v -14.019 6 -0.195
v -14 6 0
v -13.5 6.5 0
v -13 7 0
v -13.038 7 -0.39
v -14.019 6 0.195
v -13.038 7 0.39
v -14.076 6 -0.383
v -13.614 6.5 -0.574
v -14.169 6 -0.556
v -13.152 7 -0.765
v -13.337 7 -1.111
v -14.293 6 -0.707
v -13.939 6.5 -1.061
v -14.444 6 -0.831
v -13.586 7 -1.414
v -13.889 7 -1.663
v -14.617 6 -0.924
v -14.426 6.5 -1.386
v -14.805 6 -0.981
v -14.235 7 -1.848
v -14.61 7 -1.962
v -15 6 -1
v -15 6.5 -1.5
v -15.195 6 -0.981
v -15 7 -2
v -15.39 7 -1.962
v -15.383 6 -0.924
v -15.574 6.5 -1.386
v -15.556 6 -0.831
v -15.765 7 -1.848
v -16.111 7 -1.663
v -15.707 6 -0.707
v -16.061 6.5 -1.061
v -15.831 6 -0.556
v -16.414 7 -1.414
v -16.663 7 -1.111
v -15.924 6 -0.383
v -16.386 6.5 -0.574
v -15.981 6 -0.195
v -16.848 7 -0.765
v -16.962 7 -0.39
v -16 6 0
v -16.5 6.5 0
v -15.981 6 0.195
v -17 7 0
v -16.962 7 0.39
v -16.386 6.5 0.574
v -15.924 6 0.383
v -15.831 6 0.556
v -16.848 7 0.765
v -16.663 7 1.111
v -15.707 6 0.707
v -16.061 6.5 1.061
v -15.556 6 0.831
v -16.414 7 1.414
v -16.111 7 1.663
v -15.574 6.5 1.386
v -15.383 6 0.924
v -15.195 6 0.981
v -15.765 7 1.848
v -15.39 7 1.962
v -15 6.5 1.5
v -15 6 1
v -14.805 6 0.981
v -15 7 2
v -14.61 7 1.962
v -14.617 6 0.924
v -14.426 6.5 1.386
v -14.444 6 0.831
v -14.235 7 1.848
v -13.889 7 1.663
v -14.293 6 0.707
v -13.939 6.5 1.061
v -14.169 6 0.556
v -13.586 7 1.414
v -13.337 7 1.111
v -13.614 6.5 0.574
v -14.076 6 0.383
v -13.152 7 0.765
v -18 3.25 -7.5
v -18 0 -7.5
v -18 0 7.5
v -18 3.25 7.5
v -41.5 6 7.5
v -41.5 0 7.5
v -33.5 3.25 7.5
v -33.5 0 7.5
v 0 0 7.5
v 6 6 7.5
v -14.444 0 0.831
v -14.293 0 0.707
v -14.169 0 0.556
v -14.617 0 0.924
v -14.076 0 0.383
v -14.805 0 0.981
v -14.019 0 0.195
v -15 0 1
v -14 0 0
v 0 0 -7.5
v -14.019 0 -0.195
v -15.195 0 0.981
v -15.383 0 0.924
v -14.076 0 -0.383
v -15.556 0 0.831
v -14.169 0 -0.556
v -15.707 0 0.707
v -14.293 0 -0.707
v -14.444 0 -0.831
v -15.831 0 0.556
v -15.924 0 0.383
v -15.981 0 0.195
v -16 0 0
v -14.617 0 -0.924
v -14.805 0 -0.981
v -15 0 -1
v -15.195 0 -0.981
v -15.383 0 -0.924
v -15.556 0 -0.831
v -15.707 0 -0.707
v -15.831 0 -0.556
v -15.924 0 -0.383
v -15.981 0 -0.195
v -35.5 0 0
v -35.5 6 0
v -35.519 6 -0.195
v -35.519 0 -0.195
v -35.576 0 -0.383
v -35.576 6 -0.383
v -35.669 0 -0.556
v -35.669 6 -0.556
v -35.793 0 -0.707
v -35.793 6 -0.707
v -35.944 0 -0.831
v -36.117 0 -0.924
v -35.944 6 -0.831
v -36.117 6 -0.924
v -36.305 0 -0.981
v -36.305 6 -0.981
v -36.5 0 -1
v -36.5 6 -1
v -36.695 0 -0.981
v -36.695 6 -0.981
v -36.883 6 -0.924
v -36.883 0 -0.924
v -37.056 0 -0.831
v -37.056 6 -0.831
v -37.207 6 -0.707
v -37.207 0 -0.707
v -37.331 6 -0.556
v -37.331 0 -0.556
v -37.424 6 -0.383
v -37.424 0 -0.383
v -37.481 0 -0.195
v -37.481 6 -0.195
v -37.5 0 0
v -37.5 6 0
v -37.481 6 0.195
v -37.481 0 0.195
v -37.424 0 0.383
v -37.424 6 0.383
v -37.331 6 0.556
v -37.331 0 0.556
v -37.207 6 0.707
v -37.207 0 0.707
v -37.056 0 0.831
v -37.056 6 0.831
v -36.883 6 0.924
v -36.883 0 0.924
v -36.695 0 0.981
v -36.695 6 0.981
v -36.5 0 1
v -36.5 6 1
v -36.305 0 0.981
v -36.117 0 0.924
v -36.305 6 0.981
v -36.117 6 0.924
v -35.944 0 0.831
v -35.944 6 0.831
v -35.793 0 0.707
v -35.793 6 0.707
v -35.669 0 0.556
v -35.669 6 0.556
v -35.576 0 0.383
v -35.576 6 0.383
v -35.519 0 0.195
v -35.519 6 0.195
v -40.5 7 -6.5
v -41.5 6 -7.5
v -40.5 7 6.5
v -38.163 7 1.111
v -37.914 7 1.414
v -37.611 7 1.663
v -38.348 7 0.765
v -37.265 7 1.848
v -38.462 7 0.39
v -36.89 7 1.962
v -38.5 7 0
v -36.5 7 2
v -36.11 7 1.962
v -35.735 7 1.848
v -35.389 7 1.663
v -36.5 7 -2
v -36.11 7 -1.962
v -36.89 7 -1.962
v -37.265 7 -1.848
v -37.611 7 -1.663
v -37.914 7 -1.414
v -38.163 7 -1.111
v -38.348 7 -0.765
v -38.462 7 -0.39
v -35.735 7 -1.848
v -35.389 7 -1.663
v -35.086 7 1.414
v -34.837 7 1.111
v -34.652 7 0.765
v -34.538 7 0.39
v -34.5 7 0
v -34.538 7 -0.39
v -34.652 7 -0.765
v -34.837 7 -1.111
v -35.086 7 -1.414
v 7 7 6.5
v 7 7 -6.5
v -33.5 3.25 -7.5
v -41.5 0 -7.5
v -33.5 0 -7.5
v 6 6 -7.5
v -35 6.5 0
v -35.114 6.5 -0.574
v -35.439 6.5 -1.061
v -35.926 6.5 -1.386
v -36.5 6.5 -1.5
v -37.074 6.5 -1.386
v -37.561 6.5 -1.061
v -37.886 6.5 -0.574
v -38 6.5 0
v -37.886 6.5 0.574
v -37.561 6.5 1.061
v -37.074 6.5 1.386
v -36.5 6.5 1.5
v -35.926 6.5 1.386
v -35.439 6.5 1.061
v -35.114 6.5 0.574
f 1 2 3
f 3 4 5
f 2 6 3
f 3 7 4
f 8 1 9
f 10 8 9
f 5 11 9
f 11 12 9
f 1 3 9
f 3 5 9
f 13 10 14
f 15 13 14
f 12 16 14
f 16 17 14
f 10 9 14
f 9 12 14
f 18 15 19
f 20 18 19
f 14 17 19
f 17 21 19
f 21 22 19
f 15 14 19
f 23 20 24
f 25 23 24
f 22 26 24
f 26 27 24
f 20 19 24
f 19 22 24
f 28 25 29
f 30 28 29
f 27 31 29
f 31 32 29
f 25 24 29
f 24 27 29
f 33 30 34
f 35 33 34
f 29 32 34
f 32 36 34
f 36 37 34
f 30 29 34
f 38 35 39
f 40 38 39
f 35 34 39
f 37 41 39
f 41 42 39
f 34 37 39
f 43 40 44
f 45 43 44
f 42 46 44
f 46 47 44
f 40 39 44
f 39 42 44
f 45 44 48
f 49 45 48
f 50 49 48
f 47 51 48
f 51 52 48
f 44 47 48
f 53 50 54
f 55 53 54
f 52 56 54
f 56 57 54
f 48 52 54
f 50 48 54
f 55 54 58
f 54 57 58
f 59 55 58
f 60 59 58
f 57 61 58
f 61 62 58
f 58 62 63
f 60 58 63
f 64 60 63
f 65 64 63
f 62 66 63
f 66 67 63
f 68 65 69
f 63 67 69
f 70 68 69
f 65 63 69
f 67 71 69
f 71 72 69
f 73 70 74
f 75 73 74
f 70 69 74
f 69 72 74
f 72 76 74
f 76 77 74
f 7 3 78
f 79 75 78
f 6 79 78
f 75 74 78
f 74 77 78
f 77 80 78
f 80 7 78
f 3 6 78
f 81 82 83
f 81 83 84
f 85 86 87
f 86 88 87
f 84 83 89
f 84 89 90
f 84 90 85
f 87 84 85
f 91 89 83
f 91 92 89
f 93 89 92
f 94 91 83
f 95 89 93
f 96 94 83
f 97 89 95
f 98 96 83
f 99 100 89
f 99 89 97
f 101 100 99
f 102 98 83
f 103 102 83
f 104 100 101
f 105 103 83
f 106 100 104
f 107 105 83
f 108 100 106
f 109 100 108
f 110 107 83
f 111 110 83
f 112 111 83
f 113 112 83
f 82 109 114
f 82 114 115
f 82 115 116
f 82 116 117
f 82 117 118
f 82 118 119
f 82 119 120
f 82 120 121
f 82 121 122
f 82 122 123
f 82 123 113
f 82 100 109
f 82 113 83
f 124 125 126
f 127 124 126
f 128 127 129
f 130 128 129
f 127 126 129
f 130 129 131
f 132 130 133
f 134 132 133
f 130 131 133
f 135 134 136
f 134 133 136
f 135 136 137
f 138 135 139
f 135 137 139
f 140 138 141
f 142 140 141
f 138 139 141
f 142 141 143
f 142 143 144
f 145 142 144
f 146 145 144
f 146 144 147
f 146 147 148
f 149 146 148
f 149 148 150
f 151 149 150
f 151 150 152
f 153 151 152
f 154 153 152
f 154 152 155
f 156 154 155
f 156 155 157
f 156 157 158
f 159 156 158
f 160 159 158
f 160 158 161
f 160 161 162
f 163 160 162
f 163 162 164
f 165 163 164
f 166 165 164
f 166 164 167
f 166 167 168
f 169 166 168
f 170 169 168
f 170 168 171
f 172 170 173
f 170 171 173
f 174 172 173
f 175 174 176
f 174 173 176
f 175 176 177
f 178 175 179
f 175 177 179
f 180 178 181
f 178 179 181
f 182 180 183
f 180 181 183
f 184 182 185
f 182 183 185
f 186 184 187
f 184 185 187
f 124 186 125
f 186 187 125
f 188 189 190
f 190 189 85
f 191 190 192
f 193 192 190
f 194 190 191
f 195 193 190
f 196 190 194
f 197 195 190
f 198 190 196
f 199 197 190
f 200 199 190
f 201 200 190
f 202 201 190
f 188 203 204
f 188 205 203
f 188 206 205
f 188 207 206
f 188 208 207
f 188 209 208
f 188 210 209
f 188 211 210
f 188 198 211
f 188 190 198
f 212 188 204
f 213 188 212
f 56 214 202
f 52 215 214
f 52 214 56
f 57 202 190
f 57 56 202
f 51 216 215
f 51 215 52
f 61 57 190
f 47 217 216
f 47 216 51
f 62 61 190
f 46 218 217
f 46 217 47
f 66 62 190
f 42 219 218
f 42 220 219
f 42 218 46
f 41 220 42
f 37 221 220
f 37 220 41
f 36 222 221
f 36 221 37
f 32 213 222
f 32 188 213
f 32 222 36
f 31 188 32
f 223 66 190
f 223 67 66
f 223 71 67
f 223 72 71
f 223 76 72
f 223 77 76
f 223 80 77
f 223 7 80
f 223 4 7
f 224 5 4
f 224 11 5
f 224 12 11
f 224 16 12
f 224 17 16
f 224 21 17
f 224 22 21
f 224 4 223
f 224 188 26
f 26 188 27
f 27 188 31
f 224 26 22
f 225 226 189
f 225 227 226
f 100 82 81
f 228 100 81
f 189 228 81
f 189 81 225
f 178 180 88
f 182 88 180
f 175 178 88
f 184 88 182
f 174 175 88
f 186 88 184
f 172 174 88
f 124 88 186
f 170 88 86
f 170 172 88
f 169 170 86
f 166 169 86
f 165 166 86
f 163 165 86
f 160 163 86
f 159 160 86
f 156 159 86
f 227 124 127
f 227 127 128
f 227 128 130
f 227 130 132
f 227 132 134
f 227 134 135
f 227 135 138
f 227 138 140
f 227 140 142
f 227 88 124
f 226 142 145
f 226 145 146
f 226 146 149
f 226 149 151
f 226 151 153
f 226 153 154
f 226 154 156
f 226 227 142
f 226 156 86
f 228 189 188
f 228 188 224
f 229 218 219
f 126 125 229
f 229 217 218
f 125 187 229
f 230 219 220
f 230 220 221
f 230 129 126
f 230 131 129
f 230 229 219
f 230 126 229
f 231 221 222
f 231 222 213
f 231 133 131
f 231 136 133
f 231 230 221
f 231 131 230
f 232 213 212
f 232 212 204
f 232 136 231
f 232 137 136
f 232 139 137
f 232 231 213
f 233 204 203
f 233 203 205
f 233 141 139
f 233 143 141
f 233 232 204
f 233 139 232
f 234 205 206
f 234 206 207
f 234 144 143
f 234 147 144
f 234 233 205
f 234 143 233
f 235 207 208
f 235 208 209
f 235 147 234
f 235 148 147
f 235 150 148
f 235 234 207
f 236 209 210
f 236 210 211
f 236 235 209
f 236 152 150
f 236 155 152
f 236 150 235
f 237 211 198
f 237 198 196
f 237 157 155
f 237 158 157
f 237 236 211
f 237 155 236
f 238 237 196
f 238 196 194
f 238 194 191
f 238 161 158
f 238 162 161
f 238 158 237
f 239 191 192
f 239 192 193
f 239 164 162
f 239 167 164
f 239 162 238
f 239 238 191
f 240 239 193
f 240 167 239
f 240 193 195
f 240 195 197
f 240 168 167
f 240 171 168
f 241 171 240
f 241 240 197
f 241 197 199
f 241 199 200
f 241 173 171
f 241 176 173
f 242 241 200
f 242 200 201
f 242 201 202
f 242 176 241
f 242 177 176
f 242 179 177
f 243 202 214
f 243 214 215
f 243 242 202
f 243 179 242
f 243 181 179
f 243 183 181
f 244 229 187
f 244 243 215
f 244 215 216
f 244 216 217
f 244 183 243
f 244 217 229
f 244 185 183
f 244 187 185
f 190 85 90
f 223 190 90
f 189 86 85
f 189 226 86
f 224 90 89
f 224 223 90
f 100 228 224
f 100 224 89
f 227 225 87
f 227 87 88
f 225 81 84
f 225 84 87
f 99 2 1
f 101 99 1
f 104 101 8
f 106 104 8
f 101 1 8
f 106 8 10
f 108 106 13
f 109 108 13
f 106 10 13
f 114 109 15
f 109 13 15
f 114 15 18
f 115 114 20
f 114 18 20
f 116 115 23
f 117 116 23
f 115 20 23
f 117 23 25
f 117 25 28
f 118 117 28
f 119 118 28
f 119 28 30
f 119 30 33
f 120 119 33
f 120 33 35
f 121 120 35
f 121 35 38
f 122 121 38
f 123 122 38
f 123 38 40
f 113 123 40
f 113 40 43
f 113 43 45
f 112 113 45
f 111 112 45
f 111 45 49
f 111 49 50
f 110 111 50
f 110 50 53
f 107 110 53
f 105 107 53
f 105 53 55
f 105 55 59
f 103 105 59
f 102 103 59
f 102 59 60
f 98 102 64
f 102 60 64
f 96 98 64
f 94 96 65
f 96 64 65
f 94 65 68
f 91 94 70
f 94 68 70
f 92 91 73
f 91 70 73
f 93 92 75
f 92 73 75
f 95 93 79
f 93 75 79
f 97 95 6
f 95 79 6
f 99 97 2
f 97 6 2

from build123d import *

# Parameters (mm, degrees)
PAD004_DEPTH            = 7.5
SKETCH007_R             = 1
POCKET002_DEPTH         = 7.001
CHAMFER006_SIZE         = 1
CHAMFER005_SIZE         = 1
BODY003_ROLL_ANGLE      = 180
BODY003_PLACEMENT_ANGLE = 90


with BuildPart() as part:
    # Sketch006 → Pad004 (new body, symmetric)
    with BuildSketch(Plane.XY):
        Polygon((0, 0), (0, -18), (3.25, -18), (3.25, -33.5), (0, -33.5), (0, -41.5), (7, -41.5), (7, 7), align=None)
    extrude(amount=PAD004_DEPTH, both=True)

    # Sketch007 (on Face7 of Pad004) → Pocket002 (cut, through all)
    with BuildSketch(Plane.YZ.offset(7)):
        with Locations((-36.5, 0)):
            Circle(SKETCH007_R)
        with Locations((-15, 0)):
            Circle(SKETCH007_R)
    extrude(amount=-POCKET002_DEPTH, mode=Mode.SUBTRACT)

    # Chamfer006
    chamfer006_edges = [part.edges().sort_by_distance(p)[0] for p in [
        (7, -37.5, 0),
        (7, -16, 0),
    ]]
    chamfer(chamfer006_edges, length=CHAMFER006_SIZE)

    # Chamfer005
    chamfer005_edges = [part.edges().sort_by_distance(p)[0] for p in [
        (7, -17.25, 7.5),
        (7, -41.5, 0),
        (7, -17.25, -7.5),
    ]]
    chamfer(chamfer005_edges, length=CHAMFER005_SIZE)


with BuildPart() as part_1:
    # Body003 roll: moved
    add(part.part.rotate(Axis((0, 0, 0), (1, 0, 0)), BODY003_ROLL_ANGLE))


with BuildPart() as part_2:
    # Body003 placement: moved
    add(part_1.part.rotate(Axis((0, 0, 0), (0, 0, 1)), BODY003_PLACEMENT_ANGLE))


solid = part_2.part
